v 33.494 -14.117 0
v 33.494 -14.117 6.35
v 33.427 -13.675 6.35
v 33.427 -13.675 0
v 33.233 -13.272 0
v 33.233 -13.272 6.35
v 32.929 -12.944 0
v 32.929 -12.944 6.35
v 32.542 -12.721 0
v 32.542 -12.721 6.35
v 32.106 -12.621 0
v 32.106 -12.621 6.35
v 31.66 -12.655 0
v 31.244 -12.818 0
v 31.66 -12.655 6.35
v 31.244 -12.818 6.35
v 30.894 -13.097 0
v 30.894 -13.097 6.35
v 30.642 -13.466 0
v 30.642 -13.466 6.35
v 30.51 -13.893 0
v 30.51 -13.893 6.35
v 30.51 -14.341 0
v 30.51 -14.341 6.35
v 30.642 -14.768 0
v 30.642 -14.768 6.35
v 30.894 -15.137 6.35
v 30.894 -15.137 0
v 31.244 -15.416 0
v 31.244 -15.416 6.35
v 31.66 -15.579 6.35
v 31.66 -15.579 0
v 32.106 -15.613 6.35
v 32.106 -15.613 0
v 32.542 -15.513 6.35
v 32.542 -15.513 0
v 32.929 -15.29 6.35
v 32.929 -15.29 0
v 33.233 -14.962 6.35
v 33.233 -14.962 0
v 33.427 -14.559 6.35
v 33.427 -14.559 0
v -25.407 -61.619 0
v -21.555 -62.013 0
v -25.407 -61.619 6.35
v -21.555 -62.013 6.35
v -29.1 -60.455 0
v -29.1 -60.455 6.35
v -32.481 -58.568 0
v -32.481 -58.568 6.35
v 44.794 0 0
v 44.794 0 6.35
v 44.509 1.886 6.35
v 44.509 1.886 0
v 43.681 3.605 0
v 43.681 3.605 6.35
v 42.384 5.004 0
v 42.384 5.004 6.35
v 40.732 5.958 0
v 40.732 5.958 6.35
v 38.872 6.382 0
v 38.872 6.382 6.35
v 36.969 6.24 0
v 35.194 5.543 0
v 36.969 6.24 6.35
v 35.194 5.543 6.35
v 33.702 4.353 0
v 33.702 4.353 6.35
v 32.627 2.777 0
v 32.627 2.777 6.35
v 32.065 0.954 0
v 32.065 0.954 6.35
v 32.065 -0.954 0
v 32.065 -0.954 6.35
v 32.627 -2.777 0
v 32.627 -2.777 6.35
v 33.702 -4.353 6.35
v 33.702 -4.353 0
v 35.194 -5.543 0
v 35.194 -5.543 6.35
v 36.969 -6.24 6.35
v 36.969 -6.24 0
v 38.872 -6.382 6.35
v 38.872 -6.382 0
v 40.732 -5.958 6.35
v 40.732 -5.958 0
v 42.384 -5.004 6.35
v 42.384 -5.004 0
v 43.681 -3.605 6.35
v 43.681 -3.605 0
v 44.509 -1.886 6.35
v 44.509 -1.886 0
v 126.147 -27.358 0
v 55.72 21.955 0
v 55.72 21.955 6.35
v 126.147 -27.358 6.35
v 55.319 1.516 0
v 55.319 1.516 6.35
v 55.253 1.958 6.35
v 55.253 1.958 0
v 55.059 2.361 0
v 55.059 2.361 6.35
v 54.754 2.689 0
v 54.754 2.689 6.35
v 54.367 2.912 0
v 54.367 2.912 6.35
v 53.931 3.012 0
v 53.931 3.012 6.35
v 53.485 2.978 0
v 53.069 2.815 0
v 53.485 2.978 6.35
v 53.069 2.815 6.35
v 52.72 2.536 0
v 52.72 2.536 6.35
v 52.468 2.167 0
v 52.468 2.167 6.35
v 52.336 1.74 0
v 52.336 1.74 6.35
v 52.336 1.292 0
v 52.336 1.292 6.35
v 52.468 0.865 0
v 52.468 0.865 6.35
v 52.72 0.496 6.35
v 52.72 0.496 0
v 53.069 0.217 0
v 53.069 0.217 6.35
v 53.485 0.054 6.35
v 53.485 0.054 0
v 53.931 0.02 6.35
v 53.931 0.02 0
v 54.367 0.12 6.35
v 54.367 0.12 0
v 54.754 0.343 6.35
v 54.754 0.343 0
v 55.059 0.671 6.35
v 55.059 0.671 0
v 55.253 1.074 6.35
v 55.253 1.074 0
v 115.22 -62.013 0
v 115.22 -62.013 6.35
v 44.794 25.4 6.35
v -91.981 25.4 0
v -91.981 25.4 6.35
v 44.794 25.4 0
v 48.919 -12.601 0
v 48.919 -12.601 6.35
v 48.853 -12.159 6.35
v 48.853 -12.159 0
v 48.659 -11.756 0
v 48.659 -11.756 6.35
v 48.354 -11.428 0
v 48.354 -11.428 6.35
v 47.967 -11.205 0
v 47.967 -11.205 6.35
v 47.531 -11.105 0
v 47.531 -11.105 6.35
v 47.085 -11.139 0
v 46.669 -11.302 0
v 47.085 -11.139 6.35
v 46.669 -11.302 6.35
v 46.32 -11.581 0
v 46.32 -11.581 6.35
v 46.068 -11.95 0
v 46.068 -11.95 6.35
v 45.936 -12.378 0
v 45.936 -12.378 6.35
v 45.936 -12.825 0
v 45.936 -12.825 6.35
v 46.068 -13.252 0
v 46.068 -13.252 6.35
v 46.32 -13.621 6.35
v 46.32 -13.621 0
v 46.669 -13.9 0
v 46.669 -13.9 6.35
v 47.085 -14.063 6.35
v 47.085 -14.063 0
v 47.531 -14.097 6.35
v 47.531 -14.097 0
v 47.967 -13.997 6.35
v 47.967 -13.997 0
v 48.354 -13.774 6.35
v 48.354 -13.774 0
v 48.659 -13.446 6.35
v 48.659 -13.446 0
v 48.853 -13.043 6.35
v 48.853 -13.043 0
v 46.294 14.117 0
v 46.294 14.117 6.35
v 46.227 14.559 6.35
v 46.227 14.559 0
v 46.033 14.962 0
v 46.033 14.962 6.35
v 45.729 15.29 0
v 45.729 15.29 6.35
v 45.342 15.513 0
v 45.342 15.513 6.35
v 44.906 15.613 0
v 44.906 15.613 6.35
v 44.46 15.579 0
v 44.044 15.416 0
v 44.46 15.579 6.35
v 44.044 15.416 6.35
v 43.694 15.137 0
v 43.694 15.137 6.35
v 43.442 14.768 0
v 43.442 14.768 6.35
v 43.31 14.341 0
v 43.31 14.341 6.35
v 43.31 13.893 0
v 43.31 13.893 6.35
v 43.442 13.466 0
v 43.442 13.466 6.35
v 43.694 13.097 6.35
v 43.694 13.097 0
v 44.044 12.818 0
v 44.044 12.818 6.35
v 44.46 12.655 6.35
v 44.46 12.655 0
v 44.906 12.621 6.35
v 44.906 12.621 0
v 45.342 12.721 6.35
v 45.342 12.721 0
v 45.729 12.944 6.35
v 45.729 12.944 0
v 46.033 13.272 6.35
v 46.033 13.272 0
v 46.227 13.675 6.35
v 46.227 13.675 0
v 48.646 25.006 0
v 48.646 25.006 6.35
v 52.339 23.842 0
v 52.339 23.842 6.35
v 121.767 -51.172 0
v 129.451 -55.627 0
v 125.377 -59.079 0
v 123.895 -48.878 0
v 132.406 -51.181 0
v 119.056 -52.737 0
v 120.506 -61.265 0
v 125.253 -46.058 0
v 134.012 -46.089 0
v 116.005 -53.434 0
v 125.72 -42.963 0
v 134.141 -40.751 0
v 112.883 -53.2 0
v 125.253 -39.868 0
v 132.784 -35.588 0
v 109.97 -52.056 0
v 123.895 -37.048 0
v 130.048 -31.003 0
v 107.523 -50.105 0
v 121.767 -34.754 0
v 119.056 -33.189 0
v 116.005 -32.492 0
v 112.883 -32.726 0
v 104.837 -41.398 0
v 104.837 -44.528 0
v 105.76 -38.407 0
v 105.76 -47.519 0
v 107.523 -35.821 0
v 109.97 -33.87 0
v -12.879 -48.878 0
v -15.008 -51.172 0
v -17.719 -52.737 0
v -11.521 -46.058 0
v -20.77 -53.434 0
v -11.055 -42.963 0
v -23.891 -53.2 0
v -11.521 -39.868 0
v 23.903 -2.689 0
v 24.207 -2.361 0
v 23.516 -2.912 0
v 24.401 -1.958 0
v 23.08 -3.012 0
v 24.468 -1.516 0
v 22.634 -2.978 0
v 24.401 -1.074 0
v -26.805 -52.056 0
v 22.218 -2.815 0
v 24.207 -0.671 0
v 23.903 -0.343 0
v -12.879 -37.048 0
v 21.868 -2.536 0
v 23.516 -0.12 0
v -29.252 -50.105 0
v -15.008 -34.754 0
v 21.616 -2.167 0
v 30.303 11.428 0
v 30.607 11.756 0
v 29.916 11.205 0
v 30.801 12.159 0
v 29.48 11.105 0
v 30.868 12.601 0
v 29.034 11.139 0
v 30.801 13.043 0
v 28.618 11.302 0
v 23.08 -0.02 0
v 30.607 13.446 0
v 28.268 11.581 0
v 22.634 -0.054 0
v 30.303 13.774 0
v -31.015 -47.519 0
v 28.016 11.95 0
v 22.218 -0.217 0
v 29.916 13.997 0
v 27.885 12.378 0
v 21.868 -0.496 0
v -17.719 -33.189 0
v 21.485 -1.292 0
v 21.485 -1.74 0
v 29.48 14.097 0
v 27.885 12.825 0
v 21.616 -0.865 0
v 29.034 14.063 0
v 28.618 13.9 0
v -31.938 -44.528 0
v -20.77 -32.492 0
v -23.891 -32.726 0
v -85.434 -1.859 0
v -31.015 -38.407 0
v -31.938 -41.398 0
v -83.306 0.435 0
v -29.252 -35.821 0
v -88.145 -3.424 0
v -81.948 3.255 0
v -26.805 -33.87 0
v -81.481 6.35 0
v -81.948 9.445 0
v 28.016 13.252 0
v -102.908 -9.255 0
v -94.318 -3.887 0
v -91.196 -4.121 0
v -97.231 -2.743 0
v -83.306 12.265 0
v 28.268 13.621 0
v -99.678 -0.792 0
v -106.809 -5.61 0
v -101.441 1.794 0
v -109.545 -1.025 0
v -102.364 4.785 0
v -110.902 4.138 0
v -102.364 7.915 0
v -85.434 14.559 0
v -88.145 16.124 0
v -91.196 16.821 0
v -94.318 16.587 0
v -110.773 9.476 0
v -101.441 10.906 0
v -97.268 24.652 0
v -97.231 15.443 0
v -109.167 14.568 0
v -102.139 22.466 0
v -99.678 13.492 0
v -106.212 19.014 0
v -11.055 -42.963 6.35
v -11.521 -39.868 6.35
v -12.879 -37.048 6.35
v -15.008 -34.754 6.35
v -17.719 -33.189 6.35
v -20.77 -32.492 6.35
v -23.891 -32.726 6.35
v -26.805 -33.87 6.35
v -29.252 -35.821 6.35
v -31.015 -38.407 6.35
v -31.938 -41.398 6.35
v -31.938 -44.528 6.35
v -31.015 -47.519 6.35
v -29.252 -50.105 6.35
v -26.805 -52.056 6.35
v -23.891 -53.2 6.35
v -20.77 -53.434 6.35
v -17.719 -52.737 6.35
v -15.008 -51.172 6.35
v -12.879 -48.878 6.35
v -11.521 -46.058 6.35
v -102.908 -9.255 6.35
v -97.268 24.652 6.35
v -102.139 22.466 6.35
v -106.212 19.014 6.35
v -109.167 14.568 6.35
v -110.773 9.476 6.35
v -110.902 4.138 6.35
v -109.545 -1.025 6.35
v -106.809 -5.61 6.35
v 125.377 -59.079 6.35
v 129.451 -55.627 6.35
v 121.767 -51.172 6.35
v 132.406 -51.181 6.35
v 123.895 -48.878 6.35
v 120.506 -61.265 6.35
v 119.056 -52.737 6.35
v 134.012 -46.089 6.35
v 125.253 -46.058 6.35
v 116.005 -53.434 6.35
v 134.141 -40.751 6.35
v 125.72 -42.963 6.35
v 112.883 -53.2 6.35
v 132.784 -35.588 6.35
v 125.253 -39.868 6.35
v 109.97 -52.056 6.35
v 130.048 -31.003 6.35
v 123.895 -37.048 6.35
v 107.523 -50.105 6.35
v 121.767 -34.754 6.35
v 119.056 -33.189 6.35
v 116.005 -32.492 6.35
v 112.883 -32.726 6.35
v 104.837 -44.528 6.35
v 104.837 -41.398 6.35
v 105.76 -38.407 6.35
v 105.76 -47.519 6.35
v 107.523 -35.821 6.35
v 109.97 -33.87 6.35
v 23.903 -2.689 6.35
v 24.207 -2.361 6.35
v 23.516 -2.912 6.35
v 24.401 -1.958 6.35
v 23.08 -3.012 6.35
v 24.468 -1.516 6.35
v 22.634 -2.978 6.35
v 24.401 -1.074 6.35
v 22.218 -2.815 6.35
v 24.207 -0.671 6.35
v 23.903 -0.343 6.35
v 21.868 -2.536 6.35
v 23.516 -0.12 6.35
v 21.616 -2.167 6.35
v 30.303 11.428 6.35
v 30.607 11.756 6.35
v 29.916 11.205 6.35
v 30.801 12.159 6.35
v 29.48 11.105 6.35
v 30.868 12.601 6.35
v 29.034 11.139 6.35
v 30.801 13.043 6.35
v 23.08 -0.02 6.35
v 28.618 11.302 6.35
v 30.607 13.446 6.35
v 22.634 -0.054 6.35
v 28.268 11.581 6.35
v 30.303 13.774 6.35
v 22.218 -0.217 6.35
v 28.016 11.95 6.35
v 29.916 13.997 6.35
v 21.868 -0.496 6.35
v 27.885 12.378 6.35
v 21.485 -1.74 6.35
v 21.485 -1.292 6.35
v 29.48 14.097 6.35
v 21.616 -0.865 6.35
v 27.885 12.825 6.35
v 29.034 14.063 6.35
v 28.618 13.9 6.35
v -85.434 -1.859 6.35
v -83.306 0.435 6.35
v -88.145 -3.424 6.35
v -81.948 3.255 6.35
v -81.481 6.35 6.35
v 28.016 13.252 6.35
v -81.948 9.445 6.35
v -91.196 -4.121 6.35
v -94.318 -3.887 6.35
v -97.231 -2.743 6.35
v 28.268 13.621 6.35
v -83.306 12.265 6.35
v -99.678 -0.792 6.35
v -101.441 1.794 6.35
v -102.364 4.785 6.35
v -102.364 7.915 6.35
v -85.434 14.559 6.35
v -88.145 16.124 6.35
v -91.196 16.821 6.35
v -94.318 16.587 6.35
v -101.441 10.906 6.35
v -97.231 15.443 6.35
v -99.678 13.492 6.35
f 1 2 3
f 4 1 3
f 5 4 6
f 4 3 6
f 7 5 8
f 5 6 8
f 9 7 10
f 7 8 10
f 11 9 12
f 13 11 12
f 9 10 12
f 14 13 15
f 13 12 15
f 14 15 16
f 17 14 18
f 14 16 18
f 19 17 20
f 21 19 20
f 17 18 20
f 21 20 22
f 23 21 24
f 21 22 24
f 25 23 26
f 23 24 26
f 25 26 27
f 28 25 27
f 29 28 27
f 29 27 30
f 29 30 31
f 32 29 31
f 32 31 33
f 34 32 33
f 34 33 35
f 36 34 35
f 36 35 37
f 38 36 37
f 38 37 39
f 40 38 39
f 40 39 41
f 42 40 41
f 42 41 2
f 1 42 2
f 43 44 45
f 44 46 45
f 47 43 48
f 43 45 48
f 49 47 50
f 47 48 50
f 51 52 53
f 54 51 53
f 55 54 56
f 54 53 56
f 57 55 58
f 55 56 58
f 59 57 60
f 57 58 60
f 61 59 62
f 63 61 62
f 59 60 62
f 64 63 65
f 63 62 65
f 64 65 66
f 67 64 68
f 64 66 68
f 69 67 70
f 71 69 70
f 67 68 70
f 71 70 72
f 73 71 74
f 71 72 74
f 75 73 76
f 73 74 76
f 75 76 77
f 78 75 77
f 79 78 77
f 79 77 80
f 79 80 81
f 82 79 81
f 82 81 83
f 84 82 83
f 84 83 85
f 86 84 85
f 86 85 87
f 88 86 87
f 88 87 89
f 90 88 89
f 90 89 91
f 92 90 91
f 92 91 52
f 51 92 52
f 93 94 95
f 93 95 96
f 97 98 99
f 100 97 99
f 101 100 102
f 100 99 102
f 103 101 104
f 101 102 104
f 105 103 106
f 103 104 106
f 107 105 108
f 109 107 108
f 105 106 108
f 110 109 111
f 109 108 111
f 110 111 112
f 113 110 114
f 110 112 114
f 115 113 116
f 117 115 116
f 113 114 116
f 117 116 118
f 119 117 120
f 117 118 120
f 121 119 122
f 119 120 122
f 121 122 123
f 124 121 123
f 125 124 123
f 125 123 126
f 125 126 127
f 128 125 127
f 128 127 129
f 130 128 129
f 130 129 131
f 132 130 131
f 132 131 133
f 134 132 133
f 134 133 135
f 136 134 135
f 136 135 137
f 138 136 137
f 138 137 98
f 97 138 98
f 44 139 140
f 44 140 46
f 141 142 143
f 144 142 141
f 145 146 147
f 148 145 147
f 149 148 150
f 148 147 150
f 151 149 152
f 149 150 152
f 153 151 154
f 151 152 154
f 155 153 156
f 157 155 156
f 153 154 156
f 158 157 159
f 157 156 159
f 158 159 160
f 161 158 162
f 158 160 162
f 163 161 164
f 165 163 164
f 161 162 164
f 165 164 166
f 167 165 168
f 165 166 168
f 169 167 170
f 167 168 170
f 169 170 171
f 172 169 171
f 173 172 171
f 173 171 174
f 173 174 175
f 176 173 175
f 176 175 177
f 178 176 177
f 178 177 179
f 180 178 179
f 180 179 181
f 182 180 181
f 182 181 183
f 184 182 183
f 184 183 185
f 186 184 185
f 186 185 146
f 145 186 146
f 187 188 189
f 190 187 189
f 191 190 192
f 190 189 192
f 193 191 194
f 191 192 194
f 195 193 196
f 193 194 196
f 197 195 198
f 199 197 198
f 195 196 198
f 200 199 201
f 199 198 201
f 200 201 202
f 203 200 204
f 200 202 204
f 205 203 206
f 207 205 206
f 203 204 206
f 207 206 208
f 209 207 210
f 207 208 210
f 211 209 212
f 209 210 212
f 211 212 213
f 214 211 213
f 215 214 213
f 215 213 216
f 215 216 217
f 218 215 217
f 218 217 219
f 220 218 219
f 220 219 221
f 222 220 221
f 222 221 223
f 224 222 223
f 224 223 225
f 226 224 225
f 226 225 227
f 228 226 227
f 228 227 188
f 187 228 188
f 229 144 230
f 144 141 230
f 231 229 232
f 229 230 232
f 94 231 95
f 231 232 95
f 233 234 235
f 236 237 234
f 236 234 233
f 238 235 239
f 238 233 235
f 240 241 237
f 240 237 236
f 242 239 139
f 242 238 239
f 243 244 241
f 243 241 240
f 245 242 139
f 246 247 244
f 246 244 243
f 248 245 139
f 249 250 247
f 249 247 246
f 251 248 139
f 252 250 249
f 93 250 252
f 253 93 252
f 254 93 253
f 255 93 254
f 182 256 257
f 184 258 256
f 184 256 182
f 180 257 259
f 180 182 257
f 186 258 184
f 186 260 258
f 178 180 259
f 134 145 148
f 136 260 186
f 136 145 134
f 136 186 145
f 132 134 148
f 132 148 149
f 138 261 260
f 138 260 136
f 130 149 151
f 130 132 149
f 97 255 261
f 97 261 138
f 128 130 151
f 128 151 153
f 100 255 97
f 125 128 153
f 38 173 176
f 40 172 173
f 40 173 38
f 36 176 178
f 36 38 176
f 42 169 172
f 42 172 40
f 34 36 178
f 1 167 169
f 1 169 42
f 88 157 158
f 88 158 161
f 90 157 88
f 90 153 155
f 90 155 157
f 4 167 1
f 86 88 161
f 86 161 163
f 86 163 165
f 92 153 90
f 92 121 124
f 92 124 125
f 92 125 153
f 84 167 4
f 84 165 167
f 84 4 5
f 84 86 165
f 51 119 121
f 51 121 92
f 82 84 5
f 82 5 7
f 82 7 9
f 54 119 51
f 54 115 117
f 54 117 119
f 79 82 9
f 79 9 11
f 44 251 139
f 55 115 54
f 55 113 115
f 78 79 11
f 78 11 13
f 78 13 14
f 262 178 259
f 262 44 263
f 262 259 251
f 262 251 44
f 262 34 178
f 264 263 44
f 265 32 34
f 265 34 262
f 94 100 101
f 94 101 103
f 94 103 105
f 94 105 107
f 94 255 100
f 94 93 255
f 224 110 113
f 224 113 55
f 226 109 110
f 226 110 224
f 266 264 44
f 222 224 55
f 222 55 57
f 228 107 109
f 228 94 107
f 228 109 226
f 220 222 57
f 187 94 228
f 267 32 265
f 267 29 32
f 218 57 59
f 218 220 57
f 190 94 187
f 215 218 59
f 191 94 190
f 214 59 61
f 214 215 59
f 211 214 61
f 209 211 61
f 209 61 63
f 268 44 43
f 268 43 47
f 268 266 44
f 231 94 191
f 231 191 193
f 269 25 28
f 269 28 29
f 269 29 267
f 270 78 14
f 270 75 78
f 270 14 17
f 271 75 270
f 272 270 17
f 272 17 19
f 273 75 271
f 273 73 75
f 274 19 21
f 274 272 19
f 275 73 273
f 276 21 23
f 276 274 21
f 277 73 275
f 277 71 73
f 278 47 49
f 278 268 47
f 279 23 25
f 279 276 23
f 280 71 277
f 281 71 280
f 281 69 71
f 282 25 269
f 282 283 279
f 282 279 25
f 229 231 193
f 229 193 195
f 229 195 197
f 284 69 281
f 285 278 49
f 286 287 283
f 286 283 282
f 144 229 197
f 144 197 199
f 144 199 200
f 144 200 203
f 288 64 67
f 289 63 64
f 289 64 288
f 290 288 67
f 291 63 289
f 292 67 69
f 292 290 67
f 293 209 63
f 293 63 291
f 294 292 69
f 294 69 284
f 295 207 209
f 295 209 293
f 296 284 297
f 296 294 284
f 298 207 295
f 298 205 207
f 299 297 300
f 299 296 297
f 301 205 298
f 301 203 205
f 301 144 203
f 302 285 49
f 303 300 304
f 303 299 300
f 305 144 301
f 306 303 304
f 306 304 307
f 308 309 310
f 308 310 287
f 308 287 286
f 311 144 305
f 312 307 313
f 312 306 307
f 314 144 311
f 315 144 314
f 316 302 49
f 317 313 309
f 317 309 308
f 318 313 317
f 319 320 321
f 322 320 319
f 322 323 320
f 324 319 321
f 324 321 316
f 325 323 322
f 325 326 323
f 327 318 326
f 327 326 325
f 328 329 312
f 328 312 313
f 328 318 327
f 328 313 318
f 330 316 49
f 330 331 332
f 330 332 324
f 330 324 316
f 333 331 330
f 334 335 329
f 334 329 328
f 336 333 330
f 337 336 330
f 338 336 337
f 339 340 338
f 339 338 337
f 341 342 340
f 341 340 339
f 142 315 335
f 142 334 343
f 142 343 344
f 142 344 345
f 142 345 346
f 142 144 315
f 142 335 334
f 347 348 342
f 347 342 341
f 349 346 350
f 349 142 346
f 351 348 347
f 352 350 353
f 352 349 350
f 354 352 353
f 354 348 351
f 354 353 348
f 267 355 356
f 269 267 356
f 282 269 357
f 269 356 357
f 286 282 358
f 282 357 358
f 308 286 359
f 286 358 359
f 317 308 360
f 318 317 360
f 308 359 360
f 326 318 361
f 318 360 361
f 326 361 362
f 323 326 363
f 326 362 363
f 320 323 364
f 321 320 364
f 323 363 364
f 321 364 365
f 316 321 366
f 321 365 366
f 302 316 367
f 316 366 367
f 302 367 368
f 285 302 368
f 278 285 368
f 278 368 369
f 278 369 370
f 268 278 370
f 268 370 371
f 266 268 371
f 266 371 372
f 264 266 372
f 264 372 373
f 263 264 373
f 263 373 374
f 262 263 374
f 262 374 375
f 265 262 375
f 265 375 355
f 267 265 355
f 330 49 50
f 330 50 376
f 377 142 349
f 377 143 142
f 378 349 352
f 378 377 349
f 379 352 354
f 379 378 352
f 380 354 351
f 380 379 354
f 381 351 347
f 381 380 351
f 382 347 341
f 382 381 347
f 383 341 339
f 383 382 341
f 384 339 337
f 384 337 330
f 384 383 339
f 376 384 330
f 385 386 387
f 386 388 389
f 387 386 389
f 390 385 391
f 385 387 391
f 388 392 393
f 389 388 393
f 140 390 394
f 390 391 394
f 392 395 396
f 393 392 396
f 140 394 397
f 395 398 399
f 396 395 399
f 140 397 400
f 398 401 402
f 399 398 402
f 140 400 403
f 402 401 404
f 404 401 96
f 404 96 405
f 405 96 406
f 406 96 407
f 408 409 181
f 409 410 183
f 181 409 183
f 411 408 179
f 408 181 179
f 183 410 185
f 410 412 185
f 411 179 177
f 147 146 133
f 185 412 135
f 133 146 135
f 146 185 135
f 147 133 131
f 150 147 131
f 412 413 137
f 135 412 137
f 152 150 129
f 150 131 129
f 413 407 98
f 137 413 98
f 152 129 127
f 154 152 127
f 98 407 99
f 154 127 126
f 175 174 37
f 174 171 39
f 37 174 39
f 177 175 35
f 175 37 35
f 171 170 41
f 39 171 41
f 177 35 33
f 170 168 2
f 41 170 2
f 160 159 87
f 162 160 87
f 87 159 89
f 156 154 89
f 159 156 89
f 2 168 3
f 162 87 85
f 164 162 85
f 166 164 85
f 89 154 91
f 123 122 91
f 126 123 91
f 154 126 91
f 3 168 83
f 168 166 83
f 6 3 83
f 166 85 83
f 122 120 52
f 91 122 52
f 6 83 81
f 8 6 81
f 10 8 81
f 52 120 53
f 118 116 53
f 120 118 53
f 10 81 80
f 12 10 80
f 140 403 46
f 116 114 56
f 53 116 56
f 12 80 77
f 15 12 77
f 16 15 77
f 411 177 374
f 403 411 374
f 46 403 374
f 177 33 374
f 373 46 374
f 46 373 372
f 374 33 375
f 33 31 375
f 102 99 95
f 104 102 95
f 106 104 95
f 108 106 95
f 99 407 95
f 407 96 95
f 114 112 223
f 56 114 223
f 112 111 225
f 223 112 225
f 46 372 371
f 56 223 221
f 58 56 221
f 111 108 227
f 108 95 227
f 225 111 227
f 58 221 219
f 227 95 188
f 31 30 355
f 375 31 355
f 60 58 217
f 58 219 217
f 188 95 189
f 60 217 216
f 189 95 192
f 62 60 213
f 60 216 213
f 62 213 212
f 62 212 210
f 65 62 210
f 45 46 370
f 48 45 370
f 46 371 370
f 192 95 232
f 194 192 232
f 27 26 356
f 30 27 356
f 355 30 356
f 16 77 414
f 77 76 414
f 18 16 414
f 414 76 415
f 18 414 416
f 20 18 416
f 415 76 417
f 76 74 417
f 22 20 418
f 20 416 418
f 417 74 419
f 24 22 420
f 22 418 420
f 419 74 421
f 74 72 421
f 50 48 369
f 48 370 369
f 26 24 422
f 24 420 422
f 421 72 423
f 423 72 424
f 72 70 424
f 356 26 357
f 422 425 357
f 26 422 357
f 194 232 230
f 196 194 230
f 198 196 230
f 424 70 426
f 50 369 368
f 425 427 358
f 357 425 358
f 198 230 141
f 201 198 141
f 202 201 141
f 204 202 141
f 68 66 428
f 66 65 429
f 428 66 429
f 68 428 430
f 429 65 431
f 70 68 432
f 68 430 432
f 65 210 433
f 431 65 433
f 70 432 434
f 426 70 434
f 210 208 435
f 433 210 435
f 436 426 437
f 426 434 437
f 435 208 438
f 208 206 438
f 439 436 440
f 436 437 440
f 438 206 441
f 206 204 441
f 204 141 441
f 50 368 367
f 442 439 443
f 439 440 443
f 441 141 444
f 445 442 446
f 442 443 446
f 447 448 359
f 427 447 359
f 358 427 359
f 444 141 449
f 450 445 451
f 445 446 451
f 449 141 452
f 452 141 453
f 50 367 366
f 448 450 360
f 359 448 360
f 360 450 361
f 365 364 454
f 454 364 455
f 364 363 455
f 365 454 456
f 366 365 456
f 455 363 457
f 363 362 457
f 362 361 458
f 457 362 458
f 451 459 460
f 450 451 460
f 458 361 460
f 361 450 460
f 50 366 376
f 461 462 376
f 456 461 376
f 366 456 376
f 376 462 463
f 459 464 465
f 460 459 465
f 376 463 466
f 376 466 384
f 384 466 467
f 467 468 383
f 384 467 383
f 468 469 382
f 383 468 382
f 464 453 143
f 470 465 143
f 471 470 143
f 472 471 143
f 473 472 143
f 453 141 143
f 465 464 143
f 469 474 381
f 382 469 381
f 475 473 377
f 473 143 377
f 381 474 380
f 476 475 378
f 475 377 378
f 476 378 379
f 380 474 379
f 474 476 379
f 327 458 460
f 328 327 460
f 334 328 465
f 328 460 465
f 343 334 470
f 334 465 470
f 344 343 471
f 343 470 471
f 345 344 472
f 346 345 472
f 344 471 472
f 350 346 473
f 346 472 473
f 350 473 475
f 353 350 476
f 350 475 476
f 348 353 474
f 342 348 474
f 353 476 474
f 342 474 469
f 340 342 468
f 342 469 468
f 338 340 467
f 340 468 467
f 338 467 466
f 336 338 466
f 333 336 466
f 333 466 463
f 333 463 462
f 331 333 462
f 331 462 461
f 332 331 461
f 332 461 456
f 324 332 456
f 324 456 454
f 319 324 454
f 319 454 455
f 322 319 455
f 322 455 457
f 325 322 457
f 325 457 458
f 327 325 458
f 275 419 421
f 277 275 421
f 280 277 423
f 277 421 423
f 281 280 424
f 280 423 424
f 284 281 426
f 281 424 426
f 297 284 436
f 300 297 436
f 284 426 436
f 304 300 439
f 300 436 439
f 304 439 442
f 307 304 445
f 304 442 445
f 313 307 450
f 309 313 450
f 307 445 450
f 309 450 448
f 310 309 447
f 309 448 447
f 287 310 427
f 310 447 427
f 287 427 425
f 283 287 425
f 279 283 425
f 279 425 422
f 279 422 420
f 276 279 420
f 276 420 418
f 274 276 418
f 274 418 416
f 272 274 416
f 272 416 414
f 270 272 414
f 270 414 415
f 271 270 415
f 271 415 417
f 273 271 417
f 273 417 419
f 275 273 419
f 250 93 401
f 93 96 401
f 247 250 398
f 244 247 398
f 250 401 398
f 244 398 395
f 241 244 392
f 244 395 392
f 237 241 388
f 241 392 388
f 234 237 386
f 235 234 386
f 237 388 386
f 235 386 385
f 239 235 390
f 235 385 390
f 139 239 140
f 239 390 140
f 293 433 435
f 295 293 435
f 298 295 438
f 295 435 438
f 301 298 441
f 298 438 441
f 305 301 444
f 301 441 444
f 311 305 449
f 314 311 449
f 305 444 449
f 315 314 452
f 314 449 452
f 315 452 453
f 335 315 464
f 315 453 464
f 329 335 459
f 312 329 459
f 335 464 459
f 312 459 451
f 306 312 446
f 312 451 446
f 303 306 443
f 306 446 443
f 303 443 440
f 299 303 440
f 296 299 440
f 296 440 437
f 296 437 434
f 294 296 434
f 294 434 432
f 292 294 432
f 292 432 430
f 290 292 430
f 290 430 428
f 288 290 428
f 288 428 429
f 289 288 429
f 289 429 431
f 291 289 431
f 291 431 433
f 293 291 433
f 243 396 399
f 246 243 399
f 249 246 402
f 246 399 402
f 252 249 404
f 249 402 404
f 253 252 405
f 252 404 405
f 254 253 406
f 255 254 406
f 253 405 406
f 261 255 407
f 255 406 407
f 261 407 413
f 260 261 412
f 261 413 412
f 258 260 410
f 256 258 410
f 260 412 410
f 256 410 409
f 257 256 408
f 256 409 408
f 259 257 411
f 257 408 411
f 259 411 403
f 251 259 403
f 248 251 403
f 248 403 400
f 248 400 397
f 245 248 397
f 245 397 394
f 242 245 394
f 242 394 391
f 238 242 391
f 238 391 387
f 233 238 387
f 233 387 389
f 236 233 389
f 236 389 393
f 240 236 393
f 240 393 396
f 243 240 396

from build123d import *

# Parameters (mm, degrees)
BOSS_EXTRUDE1_DEPTH = 6.35
FILLET1_R           = 19.05
SKETCH4_R           = 10.5
SKETCH4_R_2         = 6.4
SKETCH4_R_3         = 1.5
CUT_EXTRUDE1_DEPTH  = 7.35


with BuildPart() as part:
    # Sketch3 → Boss-Extrude1 (new body)
    with BuildSketch(Plane.XY):
        Polygon((-152.4, 25.4), (50.8, 25.4), (175.63877155, -62.0130489), (-27.56122845, -62.0130489), align=None)
    extrude(amount=BOSS_EXTRUDE1_DEPTH)

    # Fillet1
    fillet1_edges = [part.edges().sort_by_distance(p)[0] for p in [
        (-152.4, 25.4, 3.175),
        (50.8, 25.4, 3.175),
        (175.63877155, -62.0130489, 3.175),
        (-27.56122845, -62.0130489, 3.175),
    ]]
    fillet(fillet1_edges, radius=FILLET1_R)

    # Sketch4 → Cut-Extrude1 (cut, through all)
    with BuildSketch(Plane.XY.offset(6.35)):
        with Locations((-91.981119015, 6.35)):
            Circle(SKETCH4_R)
        with Locations((38.393558072, 0)):
            Circle(SKETCH4_R_2)
        with Locations((-21.554786522, -42.9630489)):
            Circle(SKETCH4_R)
        with Locations((115.219890565, -42.9630489)):
            Circle(SKETCH4_R)
        with Locations((44.793558072, 14.117011015)):
            Circle(SKETCH4_R_3)
        with Locations((53.819248236, 1.515942923)):
            Circle(SKETCH4_R_3)
        with Locations((47.419248236, -12.601068092)):
            Circle(SKETCH4_R_3)
        with Locations((31.993558072, -14.117011015)):
            Circle(SKETCH4_R_3)
        with Locations((22.967867907, -1.515942923)):
            Circle(SKETCH4_R_3)
        with Locations((29.367867907, 12.601068092)):
            Circle(SKETCH4_R_3)
    extrude(amount=-CUT_EXTRUDE1_DEPTH, mode=Mode.SUBTRACT)


solid = part.part
